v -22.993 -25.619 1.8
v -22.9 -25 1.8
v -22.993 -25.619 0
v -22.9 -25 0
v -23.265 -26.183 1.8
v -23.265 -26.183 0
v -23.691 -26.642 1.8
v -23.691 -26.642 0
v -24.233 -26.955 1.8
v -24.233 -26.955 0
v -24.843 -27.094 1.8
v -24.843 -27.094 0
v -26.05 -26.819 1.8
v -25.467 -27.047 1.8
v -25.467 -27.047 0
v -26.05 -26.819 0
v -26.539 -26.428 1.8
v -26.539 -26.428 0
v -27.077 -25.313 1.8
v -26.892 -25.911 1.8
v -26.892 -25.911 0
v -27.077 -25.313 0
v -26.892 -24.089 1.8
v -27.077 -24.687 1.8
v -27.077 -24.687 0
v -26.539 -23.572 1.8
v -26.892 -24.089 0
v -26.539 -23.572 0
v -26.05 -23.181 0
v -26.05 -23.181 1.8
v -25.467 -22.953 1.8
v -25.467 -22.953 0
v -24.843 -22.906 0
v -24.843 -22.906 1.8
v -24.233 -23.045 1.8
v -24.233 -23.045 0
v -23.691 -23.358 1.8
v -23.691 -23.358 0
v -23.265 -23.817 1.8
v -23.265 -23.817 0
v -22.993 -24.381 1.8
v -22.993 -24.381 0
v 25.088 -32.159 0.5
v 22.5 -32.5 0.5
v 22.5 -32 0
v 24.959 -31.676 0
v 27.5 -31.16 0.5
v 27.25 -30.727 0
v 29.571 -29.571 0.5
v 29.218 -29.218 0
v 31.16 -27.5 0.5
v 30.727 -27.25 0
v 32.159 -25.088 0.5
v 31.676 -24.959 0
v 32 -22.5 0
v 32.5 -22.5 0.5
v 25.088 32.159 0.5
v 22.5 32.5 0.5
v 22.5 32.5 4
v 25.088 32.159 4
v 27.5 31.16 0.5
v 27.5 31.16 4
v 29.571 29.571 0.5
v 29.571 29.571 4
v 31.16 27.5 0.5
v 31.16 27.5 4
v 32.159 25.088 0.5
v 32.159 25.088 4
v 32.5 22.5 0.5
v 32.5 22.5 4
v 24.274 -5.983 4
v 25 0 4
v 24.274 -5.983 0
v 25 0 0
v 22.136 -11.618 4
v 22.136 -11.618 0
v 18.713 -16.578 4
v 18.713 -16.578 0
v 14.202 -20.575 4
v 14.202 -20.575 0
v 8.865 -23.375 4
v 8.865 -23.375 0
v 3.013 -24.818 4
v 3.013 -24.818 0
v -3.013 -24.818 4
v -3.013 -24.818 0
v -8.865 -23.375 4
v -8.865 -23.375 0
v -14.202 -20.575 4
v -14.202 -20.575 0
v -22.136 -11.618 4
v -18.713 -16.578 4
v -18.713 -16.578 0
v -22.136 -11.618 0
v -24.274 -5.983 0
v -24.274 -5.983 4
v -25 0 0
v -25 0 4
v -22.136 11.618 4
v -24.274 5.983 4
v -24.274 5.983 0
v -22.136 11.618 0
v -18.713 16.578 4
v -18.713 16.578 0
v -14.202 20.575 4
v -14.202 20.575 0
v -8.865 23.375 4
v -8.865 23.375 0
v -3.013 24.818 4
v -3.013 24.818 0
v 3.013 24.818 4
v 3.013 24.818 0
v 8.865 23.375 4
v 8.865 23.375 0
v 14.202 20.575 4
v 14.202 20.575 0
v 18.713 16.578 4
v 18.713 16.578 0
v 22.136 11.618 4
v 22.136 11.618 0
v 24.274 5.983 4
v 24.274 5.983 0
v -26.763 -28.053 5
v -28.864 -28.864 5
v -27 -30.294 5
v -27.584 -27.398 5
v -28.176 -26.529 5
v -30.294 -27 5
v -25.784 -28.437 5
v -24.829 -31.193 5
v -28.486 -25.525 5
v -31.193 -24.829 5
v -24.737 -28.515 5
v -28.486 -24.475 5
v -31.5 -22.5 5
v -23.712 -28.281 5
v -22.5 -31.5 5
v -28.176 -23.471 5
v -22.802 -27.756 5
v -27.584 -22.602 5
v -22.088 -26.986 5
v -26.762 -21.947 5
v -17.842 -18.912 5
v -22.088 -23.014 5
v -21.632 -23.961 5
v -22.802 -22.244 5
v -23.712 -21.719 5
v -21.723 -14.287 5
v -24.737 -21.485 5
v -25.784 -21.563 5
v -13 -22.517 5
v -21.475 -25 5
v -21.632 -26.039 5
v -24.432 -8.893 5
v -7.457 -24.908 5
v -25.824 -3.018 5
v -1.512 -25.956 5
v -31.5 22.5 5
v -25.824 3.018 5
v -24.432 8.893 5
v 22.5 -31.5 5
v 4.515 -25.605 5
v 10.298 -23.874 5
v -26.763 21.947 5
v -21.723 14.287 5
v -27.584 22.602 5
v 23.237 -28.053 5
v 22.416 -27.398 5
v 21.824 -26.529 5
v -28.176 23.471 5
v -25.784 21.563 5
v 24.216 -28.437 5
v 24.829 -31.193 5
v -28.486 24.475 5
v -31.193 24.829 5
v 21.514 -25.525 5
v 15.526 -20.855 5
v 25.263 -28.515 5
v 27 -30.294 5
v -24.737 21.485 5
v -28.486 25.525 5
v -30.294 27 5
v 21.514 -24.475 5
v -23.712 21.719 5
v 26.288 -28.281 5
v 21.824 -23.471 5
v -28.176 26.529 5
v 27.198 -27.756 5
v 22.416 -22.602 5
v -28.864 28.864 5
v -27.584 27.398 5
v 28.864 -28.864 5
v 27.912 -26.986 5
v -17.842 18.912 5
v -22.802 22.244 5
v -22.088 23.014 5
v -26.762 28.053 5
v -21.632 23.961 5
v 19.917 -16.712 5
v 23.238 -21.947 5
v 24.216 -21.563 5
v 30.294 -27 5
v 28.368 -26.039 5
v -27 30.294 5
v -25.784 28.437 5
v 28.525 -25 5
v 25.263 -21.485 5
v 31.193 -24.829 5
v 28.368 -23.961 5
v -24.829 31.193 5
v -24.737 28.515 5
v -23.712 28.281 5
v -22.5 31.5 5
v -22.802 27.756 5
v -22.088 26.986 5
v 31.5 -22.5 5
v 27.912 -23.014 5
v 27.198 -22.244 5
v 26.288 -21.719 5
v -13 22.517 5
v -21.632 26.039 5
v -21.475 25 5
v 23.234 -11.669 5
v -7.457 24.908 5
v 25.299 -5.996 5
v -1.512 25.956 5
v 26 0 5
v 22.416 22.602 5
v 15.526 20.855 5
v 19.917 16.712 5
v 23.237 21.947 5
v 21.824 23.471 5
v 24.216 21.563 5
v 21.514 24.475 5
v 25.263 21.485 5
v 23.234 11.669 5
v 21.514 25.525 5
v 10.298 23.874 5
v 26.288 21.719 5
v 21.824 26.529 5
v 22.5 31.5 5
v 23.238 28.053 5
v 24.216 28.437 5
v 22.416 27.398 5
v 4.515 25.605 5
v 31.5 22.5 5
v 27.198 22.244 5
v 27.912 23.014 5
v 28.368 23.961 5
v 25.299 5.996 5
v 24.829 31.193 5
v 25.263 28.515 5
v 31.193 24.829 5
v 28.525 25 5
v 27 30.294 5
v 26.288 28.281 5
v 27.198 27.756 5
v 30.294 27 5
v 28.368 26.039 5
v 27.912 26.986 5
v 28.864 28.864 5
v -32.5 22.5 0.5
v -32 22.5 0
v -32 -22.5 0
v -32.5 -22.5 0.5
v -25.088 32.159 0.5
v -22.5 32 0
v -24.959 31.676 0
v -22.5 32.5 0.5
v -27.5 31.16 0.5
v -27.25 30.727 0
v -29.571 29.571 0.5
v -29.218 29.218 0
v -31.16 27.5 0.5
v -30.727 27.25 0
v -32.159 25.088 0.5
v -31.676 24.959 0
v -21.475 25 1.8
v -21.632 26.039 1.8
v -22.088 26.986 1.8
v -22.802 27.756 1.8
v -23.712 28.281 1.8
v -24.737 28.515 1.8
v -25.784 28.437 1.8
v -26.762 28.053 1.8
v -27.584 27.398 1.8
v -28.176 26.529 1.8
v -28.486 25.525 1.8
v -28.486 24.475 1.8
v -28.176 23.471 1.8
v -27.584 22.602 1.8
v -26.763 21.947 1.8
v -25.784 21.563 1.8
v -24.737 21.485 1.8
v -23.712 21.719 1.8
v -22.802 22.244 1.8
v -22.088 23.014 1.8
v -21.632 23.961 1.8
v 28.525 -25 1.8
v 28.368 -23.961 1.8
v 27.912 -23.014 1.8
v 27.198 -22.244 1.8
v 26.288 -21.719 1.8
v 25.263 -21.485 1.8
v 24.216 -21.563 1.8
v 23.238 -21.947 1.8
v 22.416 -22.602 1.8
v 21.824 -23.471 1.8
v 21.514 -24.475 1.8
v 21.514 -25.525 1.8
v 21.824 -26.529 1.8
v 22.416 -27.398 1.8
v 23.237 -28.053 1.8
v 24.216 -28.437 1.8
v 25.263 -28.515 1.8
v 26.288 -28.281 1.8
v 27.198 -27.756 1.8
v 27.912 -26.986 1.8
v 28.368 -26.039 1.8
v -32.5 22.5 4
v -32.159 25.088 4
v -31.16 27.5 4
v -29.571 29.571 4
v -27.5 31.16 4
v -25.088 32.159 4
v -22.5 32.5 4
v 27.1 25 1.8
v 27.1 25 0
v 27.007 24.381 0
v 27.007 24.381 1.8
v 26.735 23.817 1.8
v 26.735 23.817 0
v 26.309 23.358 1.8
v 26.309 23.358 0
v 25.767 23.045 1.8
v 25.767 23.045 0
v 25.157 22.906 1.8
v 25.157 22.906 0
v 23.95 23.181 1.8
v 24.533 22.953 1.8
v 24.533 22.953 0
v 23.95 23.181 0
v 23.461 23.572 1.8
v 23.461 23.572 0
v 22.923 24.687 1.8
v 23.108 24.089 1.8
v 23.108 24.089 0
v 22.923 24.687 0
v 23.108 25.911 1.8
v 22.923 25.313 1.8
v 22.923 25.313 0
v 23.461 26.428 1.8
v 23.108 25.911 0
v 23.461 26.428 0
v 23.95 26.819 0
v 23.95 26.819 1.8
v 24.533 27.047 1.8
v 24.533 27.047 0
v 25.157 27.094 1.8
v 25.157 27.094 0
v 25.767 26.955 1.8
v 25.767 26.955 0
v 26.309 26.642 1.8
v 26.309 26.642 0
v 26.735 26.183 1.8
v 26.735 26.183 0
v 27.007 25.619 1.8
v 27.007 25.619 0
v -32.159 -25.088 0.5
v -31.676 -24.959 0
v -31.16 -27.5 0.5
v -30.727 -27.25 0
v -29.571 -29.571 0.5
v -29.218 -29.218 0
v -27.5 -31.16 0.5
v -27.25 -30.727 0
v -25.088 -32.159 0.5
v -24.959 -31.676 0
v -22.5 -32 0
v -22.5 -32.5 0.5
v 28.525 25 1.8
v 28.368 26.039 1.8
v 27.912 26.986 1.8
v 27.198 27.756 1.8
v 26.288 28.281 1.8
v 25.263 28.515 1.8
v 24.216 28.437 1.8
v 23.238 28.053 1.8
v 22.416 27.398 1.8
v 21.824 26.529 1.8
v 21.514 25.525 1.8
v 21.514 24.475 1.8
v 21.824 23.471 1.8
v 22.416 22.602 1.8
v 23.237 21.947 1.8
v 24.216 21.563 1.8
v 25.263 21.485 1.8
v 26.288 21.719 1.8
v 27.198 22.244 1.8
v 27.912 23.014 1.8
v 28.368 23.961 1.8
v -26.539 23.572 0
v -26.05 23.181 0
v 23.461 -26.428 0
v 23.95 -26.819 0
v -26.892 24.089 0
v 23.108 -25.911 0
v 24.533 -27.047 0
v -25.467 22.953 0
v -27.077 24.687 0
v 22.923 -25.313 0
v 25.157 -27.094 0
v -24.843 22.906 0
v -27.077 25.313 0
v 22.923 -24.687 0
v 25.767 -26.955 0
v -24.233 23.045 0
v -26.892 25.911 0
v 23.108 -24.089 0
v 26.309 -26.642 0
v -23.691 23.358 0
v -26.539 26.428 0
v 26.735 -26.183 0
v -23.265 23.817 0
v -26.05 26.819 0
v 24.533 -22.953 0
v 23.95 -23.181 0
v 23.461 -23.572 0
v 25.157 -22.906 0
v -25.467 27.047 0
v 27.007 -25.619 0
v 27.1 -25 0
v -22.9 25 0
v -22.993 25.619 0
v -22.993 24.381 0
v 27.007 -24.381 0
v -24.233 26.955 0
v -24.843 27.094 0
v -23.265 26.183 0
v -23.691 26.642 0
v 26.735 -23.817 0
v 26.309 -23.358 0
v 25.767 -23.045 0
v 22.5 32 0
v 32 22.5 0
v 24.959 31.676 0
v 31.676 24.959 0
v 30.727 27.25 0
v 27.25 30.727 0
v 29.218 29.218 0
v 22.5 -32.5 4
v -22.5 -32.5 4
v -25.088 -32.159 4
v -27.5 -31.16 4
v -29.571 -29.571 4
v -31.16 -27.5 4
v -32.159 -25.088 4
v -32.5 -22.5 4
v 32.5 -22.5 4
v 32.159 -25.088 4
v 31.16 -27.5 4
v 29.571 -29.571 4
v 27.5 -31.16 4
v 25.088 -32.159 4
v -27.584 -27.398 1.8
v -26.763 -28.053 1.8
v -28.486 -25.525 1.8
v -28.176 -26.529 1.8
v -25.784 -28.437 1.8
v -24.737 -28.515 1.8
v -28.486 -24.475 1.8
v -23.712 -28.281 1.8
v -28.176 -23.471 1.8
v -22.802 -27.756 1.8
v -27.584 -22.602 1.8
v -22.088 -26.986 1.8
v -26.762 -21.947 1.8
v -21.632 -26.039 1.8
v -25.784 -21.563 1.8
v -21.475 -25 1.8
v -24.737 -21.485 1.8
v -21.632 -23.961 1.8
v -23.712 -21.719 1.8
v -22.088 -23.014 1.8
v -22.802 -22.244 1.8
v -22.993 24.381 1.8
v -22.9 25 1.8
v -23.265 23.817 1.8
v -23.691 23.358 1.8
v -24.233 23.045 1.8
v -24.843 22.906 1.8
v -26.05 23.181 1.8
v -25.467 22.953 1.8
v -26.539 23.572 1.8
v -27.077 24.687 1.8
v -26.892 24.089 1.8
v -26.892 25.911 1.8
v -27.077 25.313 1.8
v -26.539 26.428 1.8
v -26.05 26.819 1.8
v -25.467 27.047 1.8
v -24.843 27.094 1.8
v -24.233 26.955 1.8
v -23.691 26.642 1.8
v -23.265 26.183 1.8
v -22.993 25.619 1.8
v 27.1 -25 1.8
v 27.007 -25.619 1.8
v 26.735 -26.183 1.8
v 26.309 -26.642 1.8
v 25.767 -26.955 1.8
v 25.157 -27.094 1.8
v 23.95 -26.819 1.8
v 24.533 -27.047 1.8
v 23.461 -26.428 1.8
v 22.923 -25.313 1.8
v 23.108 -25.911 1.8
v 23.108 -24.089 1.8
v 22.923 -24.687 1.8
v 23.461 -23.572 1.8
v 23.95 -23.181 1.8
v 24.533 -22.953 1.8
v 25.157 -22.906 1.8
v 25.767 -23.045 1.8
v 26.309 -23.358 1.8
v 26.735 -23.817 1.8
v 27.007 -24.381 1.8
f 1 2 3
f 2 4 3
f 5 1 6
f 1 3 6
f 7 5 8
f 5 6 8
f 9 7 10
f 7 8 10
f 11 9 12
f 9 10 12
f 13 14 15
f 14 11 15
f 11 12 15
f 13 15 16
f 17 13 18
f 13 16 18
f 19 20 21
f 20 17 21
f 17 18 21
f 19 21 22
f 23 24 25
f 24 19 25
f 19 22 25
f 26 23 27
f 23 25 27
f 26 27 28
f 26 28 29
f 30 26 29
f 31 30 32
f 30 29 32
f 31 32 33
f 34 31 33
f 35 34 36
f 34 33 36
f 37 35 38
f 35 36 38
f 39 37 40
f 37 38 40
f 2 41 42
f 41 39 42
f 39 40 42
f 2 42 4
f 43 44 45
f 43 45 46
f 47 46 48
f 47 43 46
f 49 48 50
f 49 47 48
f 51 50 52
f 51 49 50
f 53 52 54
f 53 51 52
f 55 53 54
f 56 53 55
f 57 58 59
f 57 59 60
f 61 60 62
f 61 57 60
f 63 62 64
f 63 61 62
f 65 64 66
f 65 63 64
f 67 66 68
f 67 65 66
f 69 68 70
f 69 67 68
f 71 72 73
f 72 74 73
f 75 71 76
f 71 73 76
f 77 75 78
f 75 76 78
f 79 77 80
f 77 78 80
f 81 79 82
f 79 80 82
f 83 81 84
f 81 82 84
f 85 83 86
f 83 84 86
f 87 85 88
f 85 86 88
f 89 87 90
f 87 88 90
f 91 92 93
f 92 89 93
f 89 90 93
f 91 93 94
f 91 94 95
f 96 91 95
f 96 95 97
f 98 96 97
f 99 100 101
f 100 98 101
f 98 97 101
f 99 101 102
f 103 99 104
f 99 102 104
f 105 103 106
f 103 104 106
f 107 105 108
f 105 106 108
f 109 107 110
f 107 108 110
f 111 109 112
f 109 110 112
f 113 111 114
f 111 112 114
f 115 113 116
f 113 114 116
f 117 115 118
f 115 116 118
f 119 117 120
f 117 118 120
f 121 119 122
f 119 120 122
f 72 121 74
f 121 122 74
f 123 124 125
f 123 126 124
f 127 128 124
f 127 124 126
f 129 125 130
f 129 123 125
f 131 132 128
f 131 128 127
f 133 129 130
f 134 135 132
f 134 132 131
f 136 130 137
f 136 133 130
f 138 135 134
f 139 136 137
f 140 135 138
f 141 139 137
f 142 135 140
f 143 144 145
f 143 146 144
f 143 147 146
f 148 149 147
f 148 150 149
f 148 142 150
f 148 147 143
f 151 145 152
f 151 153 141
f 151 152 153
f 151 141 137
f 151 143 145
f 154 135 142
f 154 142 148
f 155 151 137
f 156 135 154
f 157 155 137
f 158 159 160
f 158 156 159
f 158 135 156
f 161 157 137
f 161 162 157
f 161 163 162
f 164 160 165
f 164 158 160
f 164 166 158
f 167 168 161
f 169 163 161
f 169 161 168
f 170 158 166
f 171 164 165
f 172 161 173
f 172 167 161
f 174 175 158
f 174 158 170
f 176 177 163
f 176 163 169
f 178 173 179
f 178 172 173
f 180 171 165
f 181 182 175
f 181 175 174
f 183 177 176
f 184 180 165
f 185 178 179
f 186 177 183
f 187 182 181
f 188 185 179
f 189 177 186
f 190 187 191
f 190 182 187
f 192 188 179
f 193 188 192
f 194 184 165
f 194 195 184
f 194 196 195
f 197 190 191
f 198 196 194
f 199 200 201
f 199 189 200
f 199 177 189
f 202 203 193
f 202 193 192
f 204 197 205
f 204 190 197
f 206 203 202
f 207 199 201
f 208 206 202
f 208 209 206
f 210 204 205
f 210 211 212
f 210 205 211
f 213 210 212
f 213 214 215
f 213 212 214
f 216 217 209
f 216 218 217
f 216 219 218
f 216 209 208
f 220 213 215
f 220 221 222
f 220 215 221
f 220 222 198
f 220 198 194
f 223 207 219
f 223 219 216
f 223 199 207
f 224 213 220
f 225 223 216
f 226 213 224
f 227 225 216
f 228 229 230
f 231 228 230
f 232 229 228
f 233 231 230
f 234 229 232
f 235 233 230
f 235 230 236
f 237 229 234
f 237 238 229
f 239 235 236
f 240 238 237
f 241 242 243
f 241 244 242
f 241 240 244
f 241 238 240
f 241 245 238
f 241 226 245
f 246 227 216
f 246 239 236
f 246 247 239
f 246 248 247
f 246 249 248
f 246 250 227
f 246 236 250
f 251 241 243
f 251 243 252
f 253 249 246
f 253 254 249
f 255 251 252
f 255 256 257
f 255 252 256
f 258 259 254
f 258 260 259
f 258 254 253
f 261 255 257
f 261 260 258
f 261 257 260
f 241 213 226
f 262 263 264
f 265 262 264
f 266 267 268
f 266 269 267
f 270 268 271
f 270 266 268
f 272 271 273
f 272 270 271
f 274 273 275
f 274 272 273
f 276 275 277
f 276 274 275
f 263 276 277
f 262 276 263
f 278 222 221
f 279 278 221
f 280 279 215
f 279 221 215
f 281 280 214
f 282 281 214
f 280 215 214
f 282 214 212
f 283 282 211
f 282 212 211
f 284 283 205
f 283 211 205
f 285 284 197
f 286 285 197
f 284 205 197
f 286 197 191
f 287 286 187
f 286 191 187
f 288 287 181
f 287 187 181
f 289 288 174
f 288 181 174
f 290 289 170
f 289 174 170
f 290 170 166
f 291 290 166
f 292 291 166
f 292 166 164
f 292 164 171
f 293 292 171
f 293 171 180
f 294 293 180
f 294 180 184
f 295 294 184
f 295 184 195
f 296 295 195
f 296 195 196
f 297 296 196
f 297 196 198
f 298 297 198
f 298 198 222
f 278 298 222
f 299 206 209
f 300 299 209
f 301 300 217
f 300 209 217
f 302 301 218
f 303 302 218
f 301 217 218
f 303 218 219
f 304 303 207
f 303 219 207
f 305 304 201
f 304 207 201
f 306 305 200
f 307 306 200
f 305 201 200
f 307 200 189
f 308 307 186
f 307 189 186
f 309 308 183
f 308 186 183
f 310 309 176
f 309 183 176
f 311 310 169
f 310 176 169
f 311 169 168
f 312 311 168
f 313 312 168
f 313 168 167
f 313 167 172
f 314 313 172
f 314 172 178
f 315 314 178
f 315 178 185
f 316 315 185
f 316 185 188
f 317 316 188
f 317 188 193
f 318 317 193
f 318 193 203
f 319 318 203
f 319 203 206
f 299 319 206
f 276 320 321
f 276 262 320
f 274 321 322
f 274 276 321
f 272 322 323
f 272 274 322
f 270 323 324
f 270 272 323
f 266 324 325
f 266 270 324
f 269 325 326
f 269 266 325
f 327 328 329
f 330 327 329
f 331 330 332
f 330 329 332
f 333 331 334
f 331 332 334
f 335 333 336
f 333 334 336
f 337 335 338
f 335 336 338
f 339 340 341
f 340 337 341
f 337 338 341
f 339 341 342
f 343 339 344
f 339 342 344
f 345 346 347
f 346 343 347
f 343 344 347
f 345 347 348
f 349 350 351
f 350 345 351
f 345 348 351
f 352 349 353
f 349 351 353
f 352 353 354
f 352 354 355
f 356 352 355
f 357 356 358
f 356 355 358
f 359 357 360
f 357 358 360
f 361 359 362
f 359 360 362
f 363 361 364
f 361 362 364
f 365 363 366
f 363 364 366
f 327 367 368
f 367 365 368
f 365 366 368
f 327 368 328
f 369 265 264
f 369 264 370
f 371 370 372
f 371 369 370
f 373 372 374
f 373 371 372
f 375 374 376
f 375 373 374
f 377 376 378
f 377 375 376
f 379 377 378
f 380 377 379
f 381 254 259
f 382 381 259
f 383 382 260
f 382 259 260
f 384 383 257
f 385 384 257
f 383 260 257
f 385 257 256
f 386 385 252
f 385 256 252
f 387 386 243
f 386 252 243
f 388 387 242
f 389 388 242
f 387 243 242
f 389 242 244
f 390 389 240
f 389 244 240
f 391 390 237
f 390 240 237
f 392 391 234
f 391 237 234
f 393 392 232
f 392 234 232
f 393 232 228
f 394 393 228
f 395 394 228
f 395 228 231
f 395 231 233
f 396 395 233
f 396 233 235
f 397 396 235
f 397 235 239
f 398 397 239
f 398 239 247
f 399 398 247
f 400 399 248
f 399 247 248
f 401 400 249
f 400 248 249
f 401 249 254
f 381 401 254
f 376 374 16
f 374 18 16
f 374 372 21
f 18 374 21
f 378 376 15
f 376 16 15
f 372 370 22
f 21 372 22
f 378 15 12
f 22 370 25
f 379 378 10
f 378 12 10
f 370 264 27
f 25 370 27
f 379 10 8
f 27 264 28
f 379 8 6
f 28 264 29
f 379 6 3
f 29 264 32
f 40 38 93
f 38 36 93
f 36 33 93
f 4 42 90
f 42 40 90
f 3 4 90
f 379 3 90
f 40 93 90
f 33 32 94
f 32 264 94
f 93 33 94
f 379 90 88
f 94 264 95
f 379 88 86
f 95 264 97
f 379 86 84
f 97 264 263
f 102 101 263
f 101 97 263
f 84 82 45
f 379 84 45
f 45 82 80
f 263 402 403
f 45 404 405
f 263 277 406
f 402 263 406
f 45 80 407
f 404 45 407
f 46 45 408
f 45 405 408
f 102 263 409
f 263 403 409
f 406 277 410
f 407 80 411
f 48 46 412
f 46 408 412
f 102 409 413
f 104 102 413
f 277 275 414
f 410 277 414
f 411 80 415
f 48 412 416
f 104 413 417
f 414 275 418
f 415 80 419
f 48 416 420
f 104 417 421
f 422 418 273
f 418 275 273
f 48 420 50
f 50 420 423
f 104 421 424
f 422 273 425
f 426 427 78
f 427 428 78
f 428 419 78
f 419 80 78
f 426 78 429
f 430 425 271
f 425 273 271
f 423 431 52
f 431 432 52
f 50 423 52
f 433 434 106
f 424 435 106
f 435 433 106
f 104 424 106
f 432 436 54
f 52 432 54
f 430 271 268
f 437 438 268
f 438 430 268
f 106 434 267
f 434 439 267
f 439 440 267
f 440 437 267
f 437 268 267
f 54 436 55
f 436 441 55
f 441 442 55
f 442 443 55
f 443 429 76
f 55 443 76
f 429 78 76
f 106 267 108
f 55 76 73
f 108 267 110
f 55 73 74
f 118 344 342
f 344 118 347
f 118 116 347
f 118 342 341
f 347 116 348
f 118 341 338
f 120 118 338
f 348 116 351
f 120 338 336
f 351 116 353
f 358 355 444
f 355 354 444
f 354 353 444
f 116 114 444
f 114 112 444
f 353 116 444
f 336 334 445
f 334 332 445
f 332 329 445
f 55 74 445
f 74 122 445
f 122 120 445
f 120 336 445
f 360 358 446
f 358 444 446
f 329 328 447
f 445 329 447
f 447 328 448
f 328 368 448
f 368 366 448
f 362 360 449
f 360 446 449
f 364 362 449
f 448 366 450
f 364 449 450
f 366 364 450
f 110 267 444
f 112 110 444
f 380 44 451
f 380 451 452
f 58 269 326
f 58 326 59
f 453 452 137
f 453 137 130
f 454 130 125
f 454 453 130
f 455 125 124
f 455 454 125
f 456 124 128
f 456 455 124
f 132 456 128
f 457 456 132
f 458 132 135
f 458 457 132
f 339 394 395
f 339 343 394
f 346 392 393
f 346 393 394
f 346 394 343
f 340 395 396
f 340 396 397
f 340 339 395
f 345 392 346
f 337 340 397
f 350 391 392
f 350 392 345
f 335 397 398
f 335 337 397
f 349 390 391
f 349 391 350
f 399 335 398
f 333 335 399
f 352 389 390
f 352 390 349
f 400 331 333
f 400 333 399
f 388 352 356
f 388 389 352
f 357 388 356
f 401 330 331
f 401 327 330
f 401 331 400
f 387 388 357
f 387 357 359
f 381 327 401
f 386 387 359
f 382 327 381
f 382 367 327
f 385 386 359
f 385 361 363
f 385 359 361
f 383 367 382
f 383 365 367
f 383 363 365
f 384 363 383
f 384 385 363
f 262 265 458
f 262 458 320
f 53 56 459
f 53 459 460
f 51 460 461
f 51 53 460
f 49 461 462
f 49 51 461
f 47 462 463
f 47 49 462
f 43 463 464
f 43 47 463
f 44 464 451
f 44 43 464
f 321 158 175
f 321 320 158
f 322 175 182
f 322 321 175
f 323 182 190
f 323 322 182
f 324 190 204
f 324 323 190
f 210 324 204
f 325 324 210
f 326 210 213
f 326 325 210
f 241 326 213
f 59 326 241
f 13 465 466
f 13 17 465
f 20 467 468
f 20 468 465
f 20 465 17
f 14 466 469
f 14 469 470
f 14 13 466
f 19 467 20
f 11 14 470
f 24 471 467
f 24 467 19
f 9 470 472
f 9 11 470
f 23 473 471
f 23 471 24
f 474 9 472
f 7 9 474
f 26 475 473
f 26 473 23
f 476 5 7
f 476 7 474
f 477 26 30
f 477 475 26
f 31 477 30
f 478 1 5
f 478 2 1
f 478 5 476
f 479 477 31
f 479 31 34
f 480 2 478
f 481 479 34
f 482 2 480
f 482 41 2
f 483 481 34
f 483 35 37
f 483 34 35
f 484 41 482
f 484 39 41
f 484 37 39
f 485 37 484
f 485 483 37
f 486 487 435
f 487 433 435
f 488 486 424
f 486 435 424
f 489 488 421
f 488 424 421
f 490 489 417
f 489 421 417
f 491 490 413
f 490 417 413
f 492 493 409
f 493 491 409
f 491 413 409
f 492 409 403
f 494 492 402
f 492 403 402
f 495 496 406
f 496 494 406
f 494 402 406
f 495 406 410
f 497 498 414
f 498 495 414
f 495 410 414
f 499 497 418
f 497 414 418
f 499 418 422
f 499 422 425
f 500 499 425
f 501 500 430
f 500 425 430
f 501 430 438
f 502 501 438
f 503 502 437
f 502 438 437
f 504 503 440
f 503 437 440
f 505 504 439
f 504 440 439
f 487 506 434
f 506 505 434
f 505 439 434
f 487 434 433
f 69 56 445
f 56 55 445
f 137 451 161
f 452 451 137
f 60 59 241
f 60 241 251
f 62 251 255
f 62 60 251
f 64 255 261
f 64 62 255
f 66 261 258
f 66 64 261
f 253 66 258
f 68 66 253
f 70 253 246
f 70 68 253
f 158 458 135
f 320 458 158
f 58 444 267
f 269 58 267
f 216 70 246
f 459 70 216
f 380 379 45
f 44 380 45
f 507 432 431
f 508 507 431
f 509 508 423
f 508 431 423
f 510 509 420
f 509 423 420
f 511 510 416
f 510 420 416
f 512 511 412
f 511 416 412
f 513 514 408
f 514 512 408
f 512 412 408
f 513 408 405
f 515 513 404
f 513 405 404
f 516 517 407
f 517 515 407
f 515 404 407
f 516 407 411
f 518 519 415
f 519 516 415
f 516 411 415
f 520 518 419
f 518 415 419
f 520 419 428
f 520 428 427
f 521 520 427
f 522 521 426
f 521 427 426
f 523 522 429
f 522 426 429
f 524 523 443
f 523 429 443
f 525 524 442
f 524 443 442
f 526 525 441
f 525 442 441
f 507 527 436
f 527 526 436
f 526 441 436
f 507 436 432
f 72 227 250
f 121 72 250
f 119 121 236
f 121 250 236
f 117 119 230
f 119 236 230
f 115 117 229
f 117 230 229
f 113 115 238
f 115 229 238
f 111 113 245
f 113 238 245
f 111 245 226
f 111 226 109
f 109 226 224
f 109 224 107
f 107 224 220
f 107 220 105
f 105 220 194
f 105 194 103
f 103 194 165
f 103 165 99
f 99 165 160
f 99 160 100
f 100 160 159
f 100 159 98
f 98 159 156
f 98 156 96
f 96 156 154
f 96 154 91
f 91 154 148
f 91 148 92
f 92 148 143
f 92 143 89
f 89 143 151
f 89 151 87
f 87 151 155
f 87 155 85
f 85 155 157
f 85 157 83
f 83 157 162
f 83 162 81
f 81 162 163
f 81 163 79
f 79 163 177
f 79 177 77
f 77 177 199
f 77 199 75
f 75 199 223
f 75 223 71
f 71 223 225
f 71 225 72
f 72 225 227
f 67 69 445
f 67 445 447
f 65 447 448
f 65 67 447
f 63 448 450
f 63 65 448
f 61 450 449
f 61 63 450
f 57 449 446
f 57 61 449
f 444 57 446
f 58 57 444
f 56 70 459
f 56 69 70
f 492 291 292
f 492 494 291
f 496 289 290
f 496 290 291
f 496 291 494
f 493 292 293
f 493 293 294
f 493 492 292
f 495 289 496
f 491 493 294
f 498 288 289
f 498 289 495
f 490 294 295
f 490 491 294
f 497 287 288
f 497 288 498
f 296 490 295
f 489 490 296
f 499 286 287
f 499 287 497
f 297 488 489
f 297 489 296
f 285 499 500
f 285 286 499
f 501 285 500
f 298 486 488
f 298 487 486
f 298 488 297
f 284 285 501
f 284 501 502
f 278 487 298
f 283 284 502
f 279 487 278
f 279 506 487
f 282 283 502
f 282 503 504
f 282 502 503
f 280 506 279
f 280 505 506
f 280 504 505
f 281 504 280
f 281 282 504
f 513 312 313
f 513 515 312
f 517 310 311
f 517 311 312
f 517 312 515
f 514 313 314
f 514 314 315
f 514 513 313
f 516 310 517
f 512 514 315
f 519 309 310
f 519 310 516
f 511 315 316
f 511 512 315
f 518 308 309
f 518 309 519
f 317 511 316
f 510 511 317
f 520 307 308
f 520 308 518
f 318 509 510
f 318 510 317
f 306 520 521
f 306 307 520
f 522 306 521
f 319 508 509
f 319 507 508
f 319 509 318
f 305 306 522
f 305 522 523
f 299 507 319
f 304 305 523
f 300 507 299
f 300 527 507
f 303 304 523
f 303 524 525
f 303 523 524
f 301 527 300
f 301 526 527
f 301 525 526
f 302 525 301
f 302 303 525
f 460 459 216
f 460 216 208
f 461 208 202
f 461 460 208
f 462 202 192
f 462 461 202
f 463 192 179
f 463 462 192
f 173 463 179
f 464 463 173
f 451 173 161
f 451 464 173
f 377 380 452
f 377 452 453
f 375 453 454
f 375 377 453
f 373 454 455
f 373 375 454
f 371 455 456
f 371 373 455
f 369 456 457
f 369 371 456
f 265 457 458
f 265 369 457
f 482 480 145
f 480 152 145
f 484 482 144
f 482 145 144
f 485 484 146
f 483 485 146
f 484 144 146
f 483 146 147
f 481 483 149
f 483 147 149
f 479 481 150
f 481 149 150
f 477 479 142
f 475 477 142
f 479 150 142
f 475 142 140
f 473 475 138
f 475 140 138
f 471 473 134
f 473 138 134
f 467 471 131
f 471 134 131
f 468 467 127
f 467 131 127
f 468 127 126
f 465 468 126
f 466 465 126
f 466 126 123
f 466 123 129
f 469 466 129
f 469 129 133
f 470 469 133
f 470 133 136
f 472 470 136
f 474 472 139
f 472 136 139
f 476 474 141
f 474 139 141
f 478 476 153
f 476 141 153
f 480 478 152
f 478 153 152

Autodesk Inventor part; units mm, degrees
ref_plane "YZ Plane" through (0, 0, 0) normal (1, 0, 0) x (0, 1, 0)
ref_plane "XZ Plane" through (0, 0, 0) normal (0, 1, 0) x (-1, 0, 0)
ref_plane "XY Plane" through (0, 0, 0) normal (0, 0, 1) x (1, 0, 0)
sketch "Skizze1" plane through (0, 0, 0) normal (0, 0, 1) x (1, 0, 0)
  circle A0 centre (0, 0) radius 25
  line L0 (-32.5, 32.5) -> (32.5, 32.5)
  line L1 (32.5, 22.5) -> (32.5, -22.5)
  line L2 (22.5, -32.5) -> (-22.5, -32.5)
  line L3 (-32.5, -22.5) -> (-32.5, 22.5)
  line L4 (-32.5, 32.5) -> (32.5, -32.5) construction
  line L5 (32.5, 32.5) -> (-32.5, -32.5) construction
  circle A1 centre (-25, 25) radius 2.1
  circle A2 centre (25, 25) radius 2.1
  circle A3 centre (-25, -25) radius 2.1
  circle A4 centre (25, -25) radius 2.1
  line L6 (-22.5, 32.5) -> (22.5, 32.5)
  line L7 (32.5, -32.5) -> (-32.5, -32.5)
  line L8 (-32.5, -32.5) -> (-32.5, 32.5)
  line L9 (32.5, 32.5) -> (32.5, -32.5)
  arc A5 (-22.5, 32.5) -> (-32.5, 22.5) centre (-22.5, 22.5) ccw
  arc A6 (-32.5, -22.5) -> (-22.5, -32.5) centre (-22.5, -22.5) ccw
  arc A7 (22.5, -32.5) -> (32.5, -22.5) centre (22.5, -22.5) ccw
  arc A8 (32.5, 22.5) -> (22.5, 32.5) centre (22.5, 22.5) ccw
  dimension "d0" = 50
  dimension "d1" = 65
  dimension "d2" = 65
  dimension "d5" = 25
  dimension "d6" = 25
  dimension "d7" = 4.2
  dimension "d10" = 50
  dimension "d13" = 50
  dimension "d16" = 10
extrude "Extrusion1" add sketch "Skizze1" along normal blind 5 contours L0 A8 L1 A7 L2 A6 L3 A5
sketch "Skizze2" plane through (0, 0, 5) normal (0, 0, 1) x (1, 0, 0)
  circle A0 centre (-25, 25) radius 2.1 projected
  circle A1 centre (-25, 25) radius 3.525
  circle A2 centre (25, 25) radius 2.1 projected
  circle A3 centre (25, 25) radius 3.525
  circle A4 centre (-25, -25) radius 2.1 projected
  circle A5 centre (-25, -25) radius 3.525
  circle A6 centre (25, -25) radius 2.1 projected
  circle A7 centre (25, -25) radius 3.525
  point P0 (0, 0)
  dimension "d17" = 7.05
  dimension "d18" = 7.05
  dimension "d19" = 7.05
  dimension "d20" = 7.05
extrude "Extrusion2" cut sketch "Skizze2" against normal blind 3.2
chamfer "Fase1" distance 1 angle 45 9 edges at (-25, 0, 5) (0, -32.5, 5) (29.5711, -29.5711, 5) (32.5, 0, 5) (29.5711, 29.5711, 5) (0, 32.5, 5) (-29.5711, 29.5711, 5) (-32.5, 0, 5) (-29.5711, -29.5711, 5)
chamfer "Fase2" distance 0.5 angle 45 8 edges at (0, 32.5, 0) (-29.5711, 29.5711, 0) (-32.5, 0, 0) (-29.5711, -29.5711, 0) (0, -32.5, 0) (29.5711, -29.5711, 0) (32.5, 0, 0) (29.5711, 29.5711, 0)
properties part number "StageInsert_FoilHolder_Part1"
